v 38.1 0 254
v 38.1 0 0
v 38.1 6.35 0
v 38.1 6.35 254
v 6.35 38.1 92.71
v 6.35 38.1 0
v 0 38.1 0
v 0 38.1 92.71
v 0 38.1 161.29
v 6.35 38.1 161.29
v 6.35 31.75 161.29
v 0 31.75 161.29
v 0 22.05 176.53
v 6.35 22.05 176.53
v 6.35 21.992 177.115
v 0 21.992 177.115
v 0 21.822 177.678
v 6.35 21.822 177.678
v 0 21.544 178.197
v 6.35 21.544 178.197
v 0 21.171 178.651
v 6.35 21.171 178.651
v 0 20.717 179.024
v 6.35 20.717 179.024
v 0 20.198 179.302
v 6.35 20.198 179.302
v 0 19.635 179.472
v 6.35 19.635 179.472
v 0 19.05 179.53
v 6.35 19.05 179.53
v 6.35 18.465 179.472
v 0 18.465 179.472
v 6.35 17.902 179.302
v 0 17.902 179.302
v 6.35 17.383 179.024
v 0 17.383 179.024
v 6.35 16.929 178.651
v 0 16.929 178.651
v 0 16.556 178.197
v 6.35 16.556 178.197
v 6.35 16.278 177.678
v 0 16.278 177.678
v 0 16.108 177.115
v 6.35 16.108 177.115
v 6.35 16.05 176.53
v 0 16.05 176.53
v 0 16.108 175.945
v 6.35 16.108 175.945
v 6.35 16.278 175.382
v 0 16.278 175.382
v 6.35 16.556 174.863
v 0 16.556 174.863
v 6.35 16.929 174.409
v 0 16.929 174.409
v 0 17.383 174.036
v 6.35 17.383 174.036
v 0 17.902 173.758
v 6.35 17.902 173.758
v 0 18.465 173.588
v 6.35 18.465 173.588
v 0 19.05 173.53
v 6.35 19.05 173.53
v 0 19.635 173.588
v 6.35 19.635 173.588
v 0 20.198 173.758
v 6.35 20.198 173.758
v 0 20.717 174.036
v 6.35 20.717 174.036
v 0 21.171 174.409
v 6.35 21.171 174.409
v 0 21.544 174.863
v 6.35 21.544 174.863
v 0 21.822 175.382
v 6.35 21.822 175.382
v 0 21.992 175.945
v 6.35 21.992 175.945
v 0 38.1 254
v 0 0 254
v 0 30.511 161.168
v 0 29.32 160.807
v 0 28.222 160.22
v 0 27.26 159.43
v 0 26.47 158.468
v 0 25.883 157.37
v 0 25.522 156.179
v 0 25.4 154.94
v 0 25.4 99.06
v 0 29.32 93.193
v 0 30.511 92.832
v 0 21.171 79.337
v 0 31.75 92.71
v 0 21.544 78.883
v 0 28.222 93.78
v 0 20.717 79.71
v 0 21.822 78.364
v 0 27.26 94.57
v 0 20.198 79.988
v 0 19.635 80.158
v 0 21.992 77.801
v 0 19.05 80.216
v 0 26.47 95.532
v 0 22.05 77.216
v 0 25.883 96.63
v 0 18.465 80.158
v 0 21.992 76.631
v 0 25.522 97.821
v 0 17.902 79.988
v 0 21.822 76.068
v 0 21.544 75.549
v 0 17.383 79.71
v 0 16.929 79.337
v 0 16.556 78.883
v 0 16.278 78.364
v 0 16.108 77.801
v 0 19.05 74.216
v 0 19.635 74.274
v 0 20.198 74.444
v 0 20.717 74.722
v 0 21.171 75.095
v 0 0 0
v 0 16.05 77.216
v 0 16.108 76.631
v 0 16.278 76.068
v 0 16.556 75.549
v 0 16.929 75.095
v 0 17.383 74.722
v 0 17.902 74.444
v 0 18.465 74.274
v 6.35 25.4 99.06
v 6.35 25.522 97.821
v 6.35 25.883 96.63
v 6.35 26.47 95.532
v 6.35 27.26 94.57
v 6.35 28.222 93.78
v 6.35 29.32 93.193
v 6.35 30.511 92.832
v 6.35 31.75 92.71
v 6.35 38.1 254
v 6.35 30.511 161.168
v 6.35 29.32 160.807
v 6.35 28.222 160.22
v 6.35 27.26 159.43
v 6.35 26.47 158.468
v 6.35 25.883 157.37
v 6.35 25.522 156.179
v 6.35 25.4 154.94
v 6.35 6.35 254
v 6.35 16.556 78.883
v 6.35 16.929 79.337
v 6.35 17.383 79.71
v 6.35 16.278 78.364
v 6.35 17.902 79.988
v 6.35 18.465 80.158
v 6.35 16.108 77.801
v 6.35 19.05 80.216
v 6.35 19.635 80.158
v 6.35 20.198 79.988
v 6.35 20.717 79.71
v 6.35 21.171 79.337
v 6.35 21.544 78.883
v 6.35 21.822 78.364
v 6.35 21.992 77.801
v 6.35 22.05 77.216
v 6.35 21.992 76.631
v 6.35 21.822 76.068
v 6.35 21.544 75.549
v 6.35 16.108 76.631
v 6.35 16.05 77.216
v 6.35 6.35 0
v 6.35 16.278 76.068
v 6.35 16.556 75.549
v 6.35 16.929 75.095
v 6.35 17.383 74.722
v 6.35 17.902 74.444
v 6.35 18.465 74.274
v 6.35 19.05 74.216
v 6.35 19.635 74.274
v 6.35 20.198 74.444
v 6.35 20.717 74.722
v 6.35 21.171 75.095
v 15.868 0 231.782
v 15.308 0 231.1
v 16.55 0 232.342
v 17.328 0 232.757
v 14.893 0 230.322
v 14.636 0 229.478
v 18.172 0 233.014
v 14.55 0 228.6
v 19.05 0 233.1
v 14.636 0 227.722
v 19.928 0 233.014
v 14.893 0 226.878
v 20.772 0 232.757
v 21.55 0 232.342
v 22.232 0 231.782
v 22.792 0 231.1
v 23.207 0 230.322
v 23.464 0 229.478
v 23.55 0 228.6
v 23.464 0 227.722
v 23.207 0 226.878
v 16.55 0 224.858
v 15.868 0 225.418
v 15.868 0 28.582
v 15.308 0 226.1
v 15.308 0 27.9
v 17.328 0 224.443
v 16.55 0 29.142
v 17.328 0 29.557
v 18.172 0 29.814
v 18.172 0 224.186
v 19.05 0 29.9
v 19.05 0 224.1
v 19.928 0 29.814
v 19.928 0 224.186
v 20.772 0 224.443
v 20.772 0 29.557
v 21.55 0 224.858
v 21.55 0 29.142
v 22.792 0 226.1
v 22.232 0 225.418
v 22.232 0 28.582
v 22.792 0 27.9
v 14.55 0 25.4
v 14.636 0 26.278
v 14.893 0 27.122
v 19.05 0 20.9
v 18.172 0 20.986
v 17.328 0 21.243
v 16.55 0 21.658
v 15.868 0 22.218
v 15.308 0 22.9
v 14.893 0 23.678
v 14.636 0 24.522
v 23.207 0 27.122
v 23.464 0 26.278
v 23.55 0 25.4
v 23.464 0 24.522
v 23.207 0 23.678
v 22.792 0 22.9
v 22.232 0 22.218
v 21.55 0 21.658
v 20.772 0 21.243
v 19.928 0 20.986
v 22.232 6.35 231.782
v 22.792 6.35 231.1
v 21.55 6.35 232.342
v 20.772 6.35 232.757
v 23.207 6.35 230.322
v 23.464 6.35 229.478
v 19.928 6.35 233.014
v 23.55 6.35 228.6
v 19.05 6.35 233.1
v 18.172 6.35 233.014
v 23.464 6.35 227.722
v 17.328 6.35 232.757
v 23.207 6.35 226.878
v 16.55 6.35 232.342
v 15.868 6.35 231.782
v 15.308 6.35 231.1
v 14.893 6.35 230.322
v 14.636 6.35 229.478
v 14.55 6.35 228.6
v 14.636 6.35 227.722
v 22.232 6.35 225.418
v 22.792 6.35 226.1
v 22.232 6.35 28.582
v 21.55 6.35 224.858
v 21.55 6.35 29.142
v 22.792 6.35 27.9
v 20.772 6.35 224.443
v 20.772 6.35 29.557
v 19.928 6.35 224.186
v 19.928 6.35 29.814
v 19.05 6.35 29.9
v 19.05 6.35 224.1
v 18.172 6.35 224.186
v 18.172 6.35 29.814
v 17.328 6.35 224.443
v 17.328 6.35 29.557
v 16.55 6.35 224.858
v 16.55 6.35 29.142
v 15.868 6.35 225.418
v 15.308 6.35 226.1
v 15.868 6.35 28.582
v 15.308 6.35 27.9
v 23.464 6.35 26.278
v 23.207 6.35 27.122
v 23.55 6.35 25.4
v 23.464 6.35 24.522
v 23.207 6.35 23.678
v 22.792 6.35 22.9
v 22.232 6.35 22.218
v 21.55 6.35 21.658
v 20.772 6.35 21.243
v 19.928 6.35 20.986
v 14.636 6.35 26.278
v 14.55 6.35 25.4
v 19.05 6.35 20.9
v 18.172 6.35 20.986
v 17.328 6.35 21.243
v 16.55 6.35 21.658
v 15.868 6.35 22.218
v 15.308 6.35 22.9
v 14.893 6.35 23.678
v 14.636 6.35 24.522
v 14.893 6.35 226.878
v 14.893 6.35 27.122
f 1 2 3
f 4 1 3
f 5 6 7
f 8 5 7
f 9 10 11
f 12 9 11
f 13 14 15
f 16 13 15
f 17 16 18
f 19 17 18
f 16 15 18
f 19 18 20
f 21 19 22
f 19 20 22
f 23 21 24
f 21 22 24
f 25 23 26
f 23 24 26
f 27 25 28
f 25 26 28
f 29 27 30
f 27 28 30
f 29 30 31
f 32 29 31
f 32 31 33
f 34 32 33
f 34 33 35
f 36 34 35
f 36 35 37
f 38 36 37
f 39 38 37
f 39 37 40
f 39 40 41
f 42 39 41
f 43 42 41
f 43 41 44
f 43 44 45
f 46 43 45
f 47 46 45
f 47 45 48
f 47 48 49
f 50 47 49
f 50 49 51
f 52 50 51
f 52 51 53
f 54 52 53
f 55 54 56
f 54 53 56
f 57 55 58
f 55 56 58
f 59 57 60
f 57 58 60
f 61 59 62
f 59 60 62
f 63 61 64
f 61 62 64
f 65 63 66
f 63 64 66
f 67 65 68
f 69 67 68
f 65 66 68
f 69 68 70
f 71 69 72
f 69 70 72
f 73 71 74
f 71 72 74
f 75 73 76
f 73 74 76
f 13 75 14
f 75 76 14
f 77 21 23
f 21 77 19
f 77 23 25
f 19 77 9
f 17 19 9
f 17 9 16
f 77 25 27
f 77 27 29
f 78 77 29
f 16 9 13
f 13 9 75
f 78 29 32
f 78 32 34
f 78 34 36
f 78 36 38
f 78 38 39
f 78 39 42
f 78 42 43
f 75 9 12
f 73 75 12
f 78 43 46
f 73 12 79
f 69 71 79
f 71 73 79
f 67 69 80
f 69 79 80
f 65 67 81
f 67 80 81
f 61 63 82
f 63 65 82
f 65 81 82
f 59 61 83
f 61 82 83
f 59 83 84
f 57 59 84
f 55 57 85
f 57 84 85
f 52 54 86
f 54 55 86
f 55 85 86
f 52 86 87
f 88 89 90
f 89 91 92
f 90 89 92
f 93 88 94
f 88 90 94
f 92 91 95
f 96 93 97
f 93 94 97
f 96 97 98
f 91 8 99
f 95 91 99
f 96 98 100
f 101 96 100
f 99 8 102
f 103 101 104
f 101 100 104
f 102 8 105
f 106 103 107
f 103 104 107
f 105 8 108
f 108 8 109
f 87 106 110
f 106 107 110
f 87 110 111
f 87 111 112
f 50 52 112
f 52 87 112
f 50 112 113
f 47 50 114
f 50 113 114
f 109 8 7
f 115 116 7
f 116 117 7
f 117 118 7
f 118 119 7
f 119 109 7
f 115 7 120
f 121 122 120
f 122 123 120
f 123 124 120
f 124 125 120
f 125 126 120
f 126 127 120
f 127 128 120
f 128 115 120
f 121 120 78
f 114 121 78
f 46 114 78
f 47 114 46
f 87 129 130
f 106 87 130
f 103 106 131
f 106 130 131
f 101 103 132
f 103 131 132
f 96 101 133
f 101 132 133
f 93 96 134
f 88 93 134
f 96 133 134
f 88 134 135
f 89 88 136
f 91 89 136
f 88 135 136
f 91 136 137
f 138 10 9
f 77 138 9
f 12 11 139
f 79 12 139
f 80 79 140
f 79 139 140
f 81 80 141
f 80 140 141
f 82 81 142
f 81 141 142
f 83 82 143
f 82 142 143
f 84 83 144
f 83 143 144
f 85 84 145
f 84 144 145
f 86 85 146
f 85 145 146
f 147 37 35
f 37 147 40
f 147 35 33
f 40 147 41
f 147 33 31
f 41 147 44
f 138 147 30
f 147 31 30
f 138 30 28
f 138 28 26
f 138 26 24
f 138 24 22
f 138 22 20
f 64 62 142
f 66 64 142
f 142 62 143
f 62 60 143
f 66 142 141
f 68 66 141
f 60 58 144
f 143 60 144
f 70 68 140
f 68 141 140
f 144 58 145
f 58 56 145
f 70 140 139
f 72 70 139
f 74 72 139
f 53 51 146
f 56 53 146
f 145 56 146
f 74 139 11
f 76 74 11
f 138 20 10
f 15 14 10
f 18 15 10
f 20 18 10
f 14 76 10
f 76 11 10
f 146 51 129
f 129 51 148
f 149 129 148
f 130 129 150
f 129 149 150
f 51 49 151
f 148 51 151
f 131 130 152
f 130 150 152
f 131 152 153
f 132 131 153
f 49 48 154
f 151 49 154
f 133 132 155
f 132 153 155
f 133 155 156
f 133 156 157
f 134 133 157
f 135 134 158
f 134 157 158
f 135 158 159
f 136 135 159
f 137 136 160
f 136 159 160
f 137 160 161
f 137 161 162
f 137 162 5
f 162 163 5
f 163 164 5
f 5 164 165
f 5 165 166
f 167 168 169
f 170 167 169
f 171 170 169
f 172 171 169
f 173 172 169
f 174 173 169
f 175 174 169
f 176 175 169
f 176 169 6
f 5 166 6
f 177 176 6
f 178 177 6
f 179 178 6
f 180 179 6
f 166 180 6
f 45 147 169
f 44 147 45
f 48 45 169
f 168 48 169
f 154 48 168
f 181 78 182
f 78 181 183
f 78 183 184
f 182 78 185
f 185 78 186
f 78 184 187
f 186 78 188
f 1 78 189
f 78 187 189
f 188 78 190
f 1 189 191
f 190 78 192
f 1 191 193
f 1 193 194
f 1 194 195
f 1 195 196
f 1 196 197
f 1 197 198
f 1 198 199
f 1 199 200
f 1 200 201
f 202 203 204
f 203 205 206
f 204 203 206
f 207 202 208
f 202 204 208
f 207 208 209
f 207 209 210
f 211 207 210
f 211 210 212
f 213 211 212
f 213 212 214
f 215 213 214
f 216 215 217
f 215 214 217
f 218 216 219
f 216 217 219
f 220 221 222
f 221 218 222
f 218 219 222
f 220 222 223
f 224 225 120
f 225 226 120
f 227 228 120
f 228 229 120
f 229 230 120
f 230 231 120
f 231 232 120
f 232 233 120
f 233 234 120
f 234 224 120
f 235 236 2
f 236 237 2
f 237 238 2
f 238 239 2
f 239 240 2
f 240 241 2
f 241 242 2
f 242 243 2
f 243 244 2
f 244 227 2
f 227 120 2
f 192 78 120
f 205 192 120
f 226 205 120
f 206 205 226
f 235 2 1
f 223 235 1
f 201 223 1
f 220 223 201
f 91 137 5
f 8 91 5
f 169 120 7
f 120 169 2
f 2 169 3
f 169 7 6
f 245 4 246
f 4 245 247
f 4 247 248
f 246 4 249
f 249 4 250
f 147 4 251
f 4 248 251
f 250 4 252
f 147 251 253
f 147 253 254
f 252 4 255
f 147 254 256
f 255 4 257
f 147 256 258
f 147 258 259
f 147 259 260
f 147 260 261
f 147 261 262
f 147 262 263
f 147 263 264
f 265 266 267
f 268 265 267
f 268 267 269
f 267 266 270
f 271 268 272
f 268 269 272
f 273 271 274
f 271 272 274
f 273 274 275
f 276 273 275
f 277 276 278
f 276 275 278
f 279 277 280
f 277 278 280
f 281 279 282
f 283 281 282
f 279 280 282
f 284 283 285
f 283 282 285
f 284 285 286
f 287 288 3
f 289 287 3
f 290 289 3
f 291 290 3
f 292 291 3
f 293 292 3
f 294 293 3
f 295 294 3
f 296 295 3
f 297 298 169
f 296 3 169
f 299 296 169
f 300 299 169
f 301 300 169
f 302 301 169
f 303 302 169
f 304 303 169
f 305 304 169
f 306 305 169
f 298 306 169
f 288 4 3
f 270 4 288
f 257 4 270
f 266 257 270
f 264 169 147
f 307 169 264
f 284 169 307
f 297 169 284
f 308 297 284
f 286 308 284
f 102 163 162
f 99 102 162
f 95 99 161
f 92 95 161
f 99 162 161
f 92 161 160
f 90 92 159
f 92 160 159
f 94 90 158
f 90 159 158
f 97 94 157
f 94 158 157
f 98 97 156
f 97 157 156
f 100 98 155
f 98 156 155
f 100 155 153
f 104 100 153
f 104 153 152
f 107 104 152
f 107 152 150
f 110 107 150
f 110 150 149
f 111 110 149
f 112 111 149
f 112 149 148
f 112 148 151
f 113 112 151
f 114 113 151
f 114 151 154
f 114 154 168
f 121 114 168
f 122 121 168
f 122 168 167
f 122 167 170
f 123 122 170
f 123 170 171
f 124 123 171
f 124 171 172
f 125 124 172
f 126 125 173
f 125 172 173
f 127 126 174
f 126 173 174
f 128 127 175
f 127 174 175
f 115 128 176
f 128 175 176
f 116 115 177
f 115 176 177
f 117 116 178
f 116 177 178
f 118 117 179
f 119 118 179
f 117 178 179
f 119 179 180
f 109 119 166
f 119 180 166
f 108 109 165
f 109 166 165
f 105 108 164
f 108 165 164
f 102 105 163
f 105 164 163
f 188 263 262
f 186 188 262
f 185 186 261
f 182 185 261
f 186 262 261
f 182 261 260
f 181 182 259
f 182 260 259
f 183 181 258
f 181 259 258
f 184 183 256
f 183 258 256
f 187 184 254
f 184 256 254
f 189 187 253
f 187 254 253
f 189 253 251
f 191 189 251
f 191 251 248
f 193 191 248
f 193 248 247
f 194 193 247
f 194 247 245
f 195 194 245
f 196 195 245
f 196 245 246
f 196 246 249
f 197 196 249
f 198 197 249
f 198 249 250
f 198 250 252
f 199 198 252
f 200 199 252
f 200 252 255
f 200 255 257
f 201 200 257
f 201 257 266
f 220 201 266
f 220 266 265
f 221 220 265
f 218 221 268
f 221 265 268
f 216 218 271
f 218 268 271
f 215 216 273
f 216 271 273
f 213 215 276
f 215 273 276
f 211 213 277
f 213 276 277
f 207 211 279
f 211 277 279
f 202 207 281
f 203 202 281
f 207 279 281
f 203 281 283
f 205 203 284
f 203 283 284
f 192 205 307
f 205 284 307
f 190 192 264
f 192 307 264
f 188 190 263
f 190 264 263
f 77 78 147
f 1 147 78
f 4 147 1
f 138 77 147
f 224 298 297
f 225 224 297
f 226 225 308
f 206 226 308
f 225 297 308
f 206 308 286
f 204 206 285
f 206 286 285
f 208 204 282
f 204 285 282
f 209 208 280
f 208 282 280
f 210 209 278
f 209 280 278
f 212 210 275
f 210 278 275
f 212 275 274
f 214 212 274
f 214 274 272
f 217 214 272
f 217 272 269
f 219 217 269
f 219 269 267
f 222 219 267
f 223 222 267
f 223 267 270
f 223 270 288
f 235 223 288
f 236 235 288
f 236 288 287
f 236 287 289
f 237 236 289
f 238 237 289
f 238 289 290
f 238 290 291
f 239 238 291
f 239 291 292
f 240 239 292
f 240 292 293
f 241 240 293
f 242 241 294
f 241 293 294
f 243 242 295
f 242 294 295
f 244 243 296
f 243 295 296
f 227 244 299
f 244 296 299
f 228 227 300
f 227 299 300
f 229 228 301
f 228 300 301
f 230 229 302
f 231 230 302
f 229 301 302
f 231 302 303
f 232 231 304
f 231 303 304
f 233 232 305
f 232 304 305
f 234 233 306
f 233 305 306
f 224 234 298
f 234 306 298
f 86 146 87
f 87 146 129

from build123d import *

# Parameters (mm, degrees)
F1_DEPTH  = 254
F3_D      = 9
F4_D      = 9
F9_D      = 6
F11_DEPTH = 6.35


with BuildPart() as f1:
    # F0 (on Top) → F1 (new body)
    with BuildSketch(Plane.XY):
        Polygon((0, 38.1), (0, 0), (38.1, 0), (38.1, 6.35), (6.35, 6.35), (6.35, 38.1), align=None)
    extrude(amount=F1_DEPTH)

    # F3 (through all)
    with Locations(Plane.XZ):
        with Locations((19.05, 228.6)):
            Hole(F3_D / 2)

    # F4 (through all)
    with Locations(Plane.XZ):
        with Locations((19.05, 25.4)):
            Hole(F4_D / 2)

    # F9 (through all)
    with Locations(Plane(origin=(0, 0, 0), x_dir=(0, -1, 0), z_dir=(-1, 0, 0))):
        with Locations((-19.05, 77.216), (-19.05, 176.53)):
            Hole(F9_D / 2)

    # F10 (on face) → F11 (cut, through all)
    with BuildSketch(Plane.YZ.offset(6.35)):
        with BuildLine():
            ThreePointArc((31.75, 161.29), (27.259872, 159.430128), (25.4, 154.94))
            Line((25.4, 154.94), (25.4, 99.06))
            ThreePointArc((25.4, 99.06), (27.259872, 94.569872), (31.75, 92.71))
            Line((31.75, 92.71), (38.1, 92.71))
            Line((38.1, 92.71), (38.1, 161.29))
            Line((38.1, 161.29), (31.75, 161.29))
        make_face()
    extrude(amount=-F11_DEPTH, mode=Mode.SUBTRACT)


solid = f1.part
